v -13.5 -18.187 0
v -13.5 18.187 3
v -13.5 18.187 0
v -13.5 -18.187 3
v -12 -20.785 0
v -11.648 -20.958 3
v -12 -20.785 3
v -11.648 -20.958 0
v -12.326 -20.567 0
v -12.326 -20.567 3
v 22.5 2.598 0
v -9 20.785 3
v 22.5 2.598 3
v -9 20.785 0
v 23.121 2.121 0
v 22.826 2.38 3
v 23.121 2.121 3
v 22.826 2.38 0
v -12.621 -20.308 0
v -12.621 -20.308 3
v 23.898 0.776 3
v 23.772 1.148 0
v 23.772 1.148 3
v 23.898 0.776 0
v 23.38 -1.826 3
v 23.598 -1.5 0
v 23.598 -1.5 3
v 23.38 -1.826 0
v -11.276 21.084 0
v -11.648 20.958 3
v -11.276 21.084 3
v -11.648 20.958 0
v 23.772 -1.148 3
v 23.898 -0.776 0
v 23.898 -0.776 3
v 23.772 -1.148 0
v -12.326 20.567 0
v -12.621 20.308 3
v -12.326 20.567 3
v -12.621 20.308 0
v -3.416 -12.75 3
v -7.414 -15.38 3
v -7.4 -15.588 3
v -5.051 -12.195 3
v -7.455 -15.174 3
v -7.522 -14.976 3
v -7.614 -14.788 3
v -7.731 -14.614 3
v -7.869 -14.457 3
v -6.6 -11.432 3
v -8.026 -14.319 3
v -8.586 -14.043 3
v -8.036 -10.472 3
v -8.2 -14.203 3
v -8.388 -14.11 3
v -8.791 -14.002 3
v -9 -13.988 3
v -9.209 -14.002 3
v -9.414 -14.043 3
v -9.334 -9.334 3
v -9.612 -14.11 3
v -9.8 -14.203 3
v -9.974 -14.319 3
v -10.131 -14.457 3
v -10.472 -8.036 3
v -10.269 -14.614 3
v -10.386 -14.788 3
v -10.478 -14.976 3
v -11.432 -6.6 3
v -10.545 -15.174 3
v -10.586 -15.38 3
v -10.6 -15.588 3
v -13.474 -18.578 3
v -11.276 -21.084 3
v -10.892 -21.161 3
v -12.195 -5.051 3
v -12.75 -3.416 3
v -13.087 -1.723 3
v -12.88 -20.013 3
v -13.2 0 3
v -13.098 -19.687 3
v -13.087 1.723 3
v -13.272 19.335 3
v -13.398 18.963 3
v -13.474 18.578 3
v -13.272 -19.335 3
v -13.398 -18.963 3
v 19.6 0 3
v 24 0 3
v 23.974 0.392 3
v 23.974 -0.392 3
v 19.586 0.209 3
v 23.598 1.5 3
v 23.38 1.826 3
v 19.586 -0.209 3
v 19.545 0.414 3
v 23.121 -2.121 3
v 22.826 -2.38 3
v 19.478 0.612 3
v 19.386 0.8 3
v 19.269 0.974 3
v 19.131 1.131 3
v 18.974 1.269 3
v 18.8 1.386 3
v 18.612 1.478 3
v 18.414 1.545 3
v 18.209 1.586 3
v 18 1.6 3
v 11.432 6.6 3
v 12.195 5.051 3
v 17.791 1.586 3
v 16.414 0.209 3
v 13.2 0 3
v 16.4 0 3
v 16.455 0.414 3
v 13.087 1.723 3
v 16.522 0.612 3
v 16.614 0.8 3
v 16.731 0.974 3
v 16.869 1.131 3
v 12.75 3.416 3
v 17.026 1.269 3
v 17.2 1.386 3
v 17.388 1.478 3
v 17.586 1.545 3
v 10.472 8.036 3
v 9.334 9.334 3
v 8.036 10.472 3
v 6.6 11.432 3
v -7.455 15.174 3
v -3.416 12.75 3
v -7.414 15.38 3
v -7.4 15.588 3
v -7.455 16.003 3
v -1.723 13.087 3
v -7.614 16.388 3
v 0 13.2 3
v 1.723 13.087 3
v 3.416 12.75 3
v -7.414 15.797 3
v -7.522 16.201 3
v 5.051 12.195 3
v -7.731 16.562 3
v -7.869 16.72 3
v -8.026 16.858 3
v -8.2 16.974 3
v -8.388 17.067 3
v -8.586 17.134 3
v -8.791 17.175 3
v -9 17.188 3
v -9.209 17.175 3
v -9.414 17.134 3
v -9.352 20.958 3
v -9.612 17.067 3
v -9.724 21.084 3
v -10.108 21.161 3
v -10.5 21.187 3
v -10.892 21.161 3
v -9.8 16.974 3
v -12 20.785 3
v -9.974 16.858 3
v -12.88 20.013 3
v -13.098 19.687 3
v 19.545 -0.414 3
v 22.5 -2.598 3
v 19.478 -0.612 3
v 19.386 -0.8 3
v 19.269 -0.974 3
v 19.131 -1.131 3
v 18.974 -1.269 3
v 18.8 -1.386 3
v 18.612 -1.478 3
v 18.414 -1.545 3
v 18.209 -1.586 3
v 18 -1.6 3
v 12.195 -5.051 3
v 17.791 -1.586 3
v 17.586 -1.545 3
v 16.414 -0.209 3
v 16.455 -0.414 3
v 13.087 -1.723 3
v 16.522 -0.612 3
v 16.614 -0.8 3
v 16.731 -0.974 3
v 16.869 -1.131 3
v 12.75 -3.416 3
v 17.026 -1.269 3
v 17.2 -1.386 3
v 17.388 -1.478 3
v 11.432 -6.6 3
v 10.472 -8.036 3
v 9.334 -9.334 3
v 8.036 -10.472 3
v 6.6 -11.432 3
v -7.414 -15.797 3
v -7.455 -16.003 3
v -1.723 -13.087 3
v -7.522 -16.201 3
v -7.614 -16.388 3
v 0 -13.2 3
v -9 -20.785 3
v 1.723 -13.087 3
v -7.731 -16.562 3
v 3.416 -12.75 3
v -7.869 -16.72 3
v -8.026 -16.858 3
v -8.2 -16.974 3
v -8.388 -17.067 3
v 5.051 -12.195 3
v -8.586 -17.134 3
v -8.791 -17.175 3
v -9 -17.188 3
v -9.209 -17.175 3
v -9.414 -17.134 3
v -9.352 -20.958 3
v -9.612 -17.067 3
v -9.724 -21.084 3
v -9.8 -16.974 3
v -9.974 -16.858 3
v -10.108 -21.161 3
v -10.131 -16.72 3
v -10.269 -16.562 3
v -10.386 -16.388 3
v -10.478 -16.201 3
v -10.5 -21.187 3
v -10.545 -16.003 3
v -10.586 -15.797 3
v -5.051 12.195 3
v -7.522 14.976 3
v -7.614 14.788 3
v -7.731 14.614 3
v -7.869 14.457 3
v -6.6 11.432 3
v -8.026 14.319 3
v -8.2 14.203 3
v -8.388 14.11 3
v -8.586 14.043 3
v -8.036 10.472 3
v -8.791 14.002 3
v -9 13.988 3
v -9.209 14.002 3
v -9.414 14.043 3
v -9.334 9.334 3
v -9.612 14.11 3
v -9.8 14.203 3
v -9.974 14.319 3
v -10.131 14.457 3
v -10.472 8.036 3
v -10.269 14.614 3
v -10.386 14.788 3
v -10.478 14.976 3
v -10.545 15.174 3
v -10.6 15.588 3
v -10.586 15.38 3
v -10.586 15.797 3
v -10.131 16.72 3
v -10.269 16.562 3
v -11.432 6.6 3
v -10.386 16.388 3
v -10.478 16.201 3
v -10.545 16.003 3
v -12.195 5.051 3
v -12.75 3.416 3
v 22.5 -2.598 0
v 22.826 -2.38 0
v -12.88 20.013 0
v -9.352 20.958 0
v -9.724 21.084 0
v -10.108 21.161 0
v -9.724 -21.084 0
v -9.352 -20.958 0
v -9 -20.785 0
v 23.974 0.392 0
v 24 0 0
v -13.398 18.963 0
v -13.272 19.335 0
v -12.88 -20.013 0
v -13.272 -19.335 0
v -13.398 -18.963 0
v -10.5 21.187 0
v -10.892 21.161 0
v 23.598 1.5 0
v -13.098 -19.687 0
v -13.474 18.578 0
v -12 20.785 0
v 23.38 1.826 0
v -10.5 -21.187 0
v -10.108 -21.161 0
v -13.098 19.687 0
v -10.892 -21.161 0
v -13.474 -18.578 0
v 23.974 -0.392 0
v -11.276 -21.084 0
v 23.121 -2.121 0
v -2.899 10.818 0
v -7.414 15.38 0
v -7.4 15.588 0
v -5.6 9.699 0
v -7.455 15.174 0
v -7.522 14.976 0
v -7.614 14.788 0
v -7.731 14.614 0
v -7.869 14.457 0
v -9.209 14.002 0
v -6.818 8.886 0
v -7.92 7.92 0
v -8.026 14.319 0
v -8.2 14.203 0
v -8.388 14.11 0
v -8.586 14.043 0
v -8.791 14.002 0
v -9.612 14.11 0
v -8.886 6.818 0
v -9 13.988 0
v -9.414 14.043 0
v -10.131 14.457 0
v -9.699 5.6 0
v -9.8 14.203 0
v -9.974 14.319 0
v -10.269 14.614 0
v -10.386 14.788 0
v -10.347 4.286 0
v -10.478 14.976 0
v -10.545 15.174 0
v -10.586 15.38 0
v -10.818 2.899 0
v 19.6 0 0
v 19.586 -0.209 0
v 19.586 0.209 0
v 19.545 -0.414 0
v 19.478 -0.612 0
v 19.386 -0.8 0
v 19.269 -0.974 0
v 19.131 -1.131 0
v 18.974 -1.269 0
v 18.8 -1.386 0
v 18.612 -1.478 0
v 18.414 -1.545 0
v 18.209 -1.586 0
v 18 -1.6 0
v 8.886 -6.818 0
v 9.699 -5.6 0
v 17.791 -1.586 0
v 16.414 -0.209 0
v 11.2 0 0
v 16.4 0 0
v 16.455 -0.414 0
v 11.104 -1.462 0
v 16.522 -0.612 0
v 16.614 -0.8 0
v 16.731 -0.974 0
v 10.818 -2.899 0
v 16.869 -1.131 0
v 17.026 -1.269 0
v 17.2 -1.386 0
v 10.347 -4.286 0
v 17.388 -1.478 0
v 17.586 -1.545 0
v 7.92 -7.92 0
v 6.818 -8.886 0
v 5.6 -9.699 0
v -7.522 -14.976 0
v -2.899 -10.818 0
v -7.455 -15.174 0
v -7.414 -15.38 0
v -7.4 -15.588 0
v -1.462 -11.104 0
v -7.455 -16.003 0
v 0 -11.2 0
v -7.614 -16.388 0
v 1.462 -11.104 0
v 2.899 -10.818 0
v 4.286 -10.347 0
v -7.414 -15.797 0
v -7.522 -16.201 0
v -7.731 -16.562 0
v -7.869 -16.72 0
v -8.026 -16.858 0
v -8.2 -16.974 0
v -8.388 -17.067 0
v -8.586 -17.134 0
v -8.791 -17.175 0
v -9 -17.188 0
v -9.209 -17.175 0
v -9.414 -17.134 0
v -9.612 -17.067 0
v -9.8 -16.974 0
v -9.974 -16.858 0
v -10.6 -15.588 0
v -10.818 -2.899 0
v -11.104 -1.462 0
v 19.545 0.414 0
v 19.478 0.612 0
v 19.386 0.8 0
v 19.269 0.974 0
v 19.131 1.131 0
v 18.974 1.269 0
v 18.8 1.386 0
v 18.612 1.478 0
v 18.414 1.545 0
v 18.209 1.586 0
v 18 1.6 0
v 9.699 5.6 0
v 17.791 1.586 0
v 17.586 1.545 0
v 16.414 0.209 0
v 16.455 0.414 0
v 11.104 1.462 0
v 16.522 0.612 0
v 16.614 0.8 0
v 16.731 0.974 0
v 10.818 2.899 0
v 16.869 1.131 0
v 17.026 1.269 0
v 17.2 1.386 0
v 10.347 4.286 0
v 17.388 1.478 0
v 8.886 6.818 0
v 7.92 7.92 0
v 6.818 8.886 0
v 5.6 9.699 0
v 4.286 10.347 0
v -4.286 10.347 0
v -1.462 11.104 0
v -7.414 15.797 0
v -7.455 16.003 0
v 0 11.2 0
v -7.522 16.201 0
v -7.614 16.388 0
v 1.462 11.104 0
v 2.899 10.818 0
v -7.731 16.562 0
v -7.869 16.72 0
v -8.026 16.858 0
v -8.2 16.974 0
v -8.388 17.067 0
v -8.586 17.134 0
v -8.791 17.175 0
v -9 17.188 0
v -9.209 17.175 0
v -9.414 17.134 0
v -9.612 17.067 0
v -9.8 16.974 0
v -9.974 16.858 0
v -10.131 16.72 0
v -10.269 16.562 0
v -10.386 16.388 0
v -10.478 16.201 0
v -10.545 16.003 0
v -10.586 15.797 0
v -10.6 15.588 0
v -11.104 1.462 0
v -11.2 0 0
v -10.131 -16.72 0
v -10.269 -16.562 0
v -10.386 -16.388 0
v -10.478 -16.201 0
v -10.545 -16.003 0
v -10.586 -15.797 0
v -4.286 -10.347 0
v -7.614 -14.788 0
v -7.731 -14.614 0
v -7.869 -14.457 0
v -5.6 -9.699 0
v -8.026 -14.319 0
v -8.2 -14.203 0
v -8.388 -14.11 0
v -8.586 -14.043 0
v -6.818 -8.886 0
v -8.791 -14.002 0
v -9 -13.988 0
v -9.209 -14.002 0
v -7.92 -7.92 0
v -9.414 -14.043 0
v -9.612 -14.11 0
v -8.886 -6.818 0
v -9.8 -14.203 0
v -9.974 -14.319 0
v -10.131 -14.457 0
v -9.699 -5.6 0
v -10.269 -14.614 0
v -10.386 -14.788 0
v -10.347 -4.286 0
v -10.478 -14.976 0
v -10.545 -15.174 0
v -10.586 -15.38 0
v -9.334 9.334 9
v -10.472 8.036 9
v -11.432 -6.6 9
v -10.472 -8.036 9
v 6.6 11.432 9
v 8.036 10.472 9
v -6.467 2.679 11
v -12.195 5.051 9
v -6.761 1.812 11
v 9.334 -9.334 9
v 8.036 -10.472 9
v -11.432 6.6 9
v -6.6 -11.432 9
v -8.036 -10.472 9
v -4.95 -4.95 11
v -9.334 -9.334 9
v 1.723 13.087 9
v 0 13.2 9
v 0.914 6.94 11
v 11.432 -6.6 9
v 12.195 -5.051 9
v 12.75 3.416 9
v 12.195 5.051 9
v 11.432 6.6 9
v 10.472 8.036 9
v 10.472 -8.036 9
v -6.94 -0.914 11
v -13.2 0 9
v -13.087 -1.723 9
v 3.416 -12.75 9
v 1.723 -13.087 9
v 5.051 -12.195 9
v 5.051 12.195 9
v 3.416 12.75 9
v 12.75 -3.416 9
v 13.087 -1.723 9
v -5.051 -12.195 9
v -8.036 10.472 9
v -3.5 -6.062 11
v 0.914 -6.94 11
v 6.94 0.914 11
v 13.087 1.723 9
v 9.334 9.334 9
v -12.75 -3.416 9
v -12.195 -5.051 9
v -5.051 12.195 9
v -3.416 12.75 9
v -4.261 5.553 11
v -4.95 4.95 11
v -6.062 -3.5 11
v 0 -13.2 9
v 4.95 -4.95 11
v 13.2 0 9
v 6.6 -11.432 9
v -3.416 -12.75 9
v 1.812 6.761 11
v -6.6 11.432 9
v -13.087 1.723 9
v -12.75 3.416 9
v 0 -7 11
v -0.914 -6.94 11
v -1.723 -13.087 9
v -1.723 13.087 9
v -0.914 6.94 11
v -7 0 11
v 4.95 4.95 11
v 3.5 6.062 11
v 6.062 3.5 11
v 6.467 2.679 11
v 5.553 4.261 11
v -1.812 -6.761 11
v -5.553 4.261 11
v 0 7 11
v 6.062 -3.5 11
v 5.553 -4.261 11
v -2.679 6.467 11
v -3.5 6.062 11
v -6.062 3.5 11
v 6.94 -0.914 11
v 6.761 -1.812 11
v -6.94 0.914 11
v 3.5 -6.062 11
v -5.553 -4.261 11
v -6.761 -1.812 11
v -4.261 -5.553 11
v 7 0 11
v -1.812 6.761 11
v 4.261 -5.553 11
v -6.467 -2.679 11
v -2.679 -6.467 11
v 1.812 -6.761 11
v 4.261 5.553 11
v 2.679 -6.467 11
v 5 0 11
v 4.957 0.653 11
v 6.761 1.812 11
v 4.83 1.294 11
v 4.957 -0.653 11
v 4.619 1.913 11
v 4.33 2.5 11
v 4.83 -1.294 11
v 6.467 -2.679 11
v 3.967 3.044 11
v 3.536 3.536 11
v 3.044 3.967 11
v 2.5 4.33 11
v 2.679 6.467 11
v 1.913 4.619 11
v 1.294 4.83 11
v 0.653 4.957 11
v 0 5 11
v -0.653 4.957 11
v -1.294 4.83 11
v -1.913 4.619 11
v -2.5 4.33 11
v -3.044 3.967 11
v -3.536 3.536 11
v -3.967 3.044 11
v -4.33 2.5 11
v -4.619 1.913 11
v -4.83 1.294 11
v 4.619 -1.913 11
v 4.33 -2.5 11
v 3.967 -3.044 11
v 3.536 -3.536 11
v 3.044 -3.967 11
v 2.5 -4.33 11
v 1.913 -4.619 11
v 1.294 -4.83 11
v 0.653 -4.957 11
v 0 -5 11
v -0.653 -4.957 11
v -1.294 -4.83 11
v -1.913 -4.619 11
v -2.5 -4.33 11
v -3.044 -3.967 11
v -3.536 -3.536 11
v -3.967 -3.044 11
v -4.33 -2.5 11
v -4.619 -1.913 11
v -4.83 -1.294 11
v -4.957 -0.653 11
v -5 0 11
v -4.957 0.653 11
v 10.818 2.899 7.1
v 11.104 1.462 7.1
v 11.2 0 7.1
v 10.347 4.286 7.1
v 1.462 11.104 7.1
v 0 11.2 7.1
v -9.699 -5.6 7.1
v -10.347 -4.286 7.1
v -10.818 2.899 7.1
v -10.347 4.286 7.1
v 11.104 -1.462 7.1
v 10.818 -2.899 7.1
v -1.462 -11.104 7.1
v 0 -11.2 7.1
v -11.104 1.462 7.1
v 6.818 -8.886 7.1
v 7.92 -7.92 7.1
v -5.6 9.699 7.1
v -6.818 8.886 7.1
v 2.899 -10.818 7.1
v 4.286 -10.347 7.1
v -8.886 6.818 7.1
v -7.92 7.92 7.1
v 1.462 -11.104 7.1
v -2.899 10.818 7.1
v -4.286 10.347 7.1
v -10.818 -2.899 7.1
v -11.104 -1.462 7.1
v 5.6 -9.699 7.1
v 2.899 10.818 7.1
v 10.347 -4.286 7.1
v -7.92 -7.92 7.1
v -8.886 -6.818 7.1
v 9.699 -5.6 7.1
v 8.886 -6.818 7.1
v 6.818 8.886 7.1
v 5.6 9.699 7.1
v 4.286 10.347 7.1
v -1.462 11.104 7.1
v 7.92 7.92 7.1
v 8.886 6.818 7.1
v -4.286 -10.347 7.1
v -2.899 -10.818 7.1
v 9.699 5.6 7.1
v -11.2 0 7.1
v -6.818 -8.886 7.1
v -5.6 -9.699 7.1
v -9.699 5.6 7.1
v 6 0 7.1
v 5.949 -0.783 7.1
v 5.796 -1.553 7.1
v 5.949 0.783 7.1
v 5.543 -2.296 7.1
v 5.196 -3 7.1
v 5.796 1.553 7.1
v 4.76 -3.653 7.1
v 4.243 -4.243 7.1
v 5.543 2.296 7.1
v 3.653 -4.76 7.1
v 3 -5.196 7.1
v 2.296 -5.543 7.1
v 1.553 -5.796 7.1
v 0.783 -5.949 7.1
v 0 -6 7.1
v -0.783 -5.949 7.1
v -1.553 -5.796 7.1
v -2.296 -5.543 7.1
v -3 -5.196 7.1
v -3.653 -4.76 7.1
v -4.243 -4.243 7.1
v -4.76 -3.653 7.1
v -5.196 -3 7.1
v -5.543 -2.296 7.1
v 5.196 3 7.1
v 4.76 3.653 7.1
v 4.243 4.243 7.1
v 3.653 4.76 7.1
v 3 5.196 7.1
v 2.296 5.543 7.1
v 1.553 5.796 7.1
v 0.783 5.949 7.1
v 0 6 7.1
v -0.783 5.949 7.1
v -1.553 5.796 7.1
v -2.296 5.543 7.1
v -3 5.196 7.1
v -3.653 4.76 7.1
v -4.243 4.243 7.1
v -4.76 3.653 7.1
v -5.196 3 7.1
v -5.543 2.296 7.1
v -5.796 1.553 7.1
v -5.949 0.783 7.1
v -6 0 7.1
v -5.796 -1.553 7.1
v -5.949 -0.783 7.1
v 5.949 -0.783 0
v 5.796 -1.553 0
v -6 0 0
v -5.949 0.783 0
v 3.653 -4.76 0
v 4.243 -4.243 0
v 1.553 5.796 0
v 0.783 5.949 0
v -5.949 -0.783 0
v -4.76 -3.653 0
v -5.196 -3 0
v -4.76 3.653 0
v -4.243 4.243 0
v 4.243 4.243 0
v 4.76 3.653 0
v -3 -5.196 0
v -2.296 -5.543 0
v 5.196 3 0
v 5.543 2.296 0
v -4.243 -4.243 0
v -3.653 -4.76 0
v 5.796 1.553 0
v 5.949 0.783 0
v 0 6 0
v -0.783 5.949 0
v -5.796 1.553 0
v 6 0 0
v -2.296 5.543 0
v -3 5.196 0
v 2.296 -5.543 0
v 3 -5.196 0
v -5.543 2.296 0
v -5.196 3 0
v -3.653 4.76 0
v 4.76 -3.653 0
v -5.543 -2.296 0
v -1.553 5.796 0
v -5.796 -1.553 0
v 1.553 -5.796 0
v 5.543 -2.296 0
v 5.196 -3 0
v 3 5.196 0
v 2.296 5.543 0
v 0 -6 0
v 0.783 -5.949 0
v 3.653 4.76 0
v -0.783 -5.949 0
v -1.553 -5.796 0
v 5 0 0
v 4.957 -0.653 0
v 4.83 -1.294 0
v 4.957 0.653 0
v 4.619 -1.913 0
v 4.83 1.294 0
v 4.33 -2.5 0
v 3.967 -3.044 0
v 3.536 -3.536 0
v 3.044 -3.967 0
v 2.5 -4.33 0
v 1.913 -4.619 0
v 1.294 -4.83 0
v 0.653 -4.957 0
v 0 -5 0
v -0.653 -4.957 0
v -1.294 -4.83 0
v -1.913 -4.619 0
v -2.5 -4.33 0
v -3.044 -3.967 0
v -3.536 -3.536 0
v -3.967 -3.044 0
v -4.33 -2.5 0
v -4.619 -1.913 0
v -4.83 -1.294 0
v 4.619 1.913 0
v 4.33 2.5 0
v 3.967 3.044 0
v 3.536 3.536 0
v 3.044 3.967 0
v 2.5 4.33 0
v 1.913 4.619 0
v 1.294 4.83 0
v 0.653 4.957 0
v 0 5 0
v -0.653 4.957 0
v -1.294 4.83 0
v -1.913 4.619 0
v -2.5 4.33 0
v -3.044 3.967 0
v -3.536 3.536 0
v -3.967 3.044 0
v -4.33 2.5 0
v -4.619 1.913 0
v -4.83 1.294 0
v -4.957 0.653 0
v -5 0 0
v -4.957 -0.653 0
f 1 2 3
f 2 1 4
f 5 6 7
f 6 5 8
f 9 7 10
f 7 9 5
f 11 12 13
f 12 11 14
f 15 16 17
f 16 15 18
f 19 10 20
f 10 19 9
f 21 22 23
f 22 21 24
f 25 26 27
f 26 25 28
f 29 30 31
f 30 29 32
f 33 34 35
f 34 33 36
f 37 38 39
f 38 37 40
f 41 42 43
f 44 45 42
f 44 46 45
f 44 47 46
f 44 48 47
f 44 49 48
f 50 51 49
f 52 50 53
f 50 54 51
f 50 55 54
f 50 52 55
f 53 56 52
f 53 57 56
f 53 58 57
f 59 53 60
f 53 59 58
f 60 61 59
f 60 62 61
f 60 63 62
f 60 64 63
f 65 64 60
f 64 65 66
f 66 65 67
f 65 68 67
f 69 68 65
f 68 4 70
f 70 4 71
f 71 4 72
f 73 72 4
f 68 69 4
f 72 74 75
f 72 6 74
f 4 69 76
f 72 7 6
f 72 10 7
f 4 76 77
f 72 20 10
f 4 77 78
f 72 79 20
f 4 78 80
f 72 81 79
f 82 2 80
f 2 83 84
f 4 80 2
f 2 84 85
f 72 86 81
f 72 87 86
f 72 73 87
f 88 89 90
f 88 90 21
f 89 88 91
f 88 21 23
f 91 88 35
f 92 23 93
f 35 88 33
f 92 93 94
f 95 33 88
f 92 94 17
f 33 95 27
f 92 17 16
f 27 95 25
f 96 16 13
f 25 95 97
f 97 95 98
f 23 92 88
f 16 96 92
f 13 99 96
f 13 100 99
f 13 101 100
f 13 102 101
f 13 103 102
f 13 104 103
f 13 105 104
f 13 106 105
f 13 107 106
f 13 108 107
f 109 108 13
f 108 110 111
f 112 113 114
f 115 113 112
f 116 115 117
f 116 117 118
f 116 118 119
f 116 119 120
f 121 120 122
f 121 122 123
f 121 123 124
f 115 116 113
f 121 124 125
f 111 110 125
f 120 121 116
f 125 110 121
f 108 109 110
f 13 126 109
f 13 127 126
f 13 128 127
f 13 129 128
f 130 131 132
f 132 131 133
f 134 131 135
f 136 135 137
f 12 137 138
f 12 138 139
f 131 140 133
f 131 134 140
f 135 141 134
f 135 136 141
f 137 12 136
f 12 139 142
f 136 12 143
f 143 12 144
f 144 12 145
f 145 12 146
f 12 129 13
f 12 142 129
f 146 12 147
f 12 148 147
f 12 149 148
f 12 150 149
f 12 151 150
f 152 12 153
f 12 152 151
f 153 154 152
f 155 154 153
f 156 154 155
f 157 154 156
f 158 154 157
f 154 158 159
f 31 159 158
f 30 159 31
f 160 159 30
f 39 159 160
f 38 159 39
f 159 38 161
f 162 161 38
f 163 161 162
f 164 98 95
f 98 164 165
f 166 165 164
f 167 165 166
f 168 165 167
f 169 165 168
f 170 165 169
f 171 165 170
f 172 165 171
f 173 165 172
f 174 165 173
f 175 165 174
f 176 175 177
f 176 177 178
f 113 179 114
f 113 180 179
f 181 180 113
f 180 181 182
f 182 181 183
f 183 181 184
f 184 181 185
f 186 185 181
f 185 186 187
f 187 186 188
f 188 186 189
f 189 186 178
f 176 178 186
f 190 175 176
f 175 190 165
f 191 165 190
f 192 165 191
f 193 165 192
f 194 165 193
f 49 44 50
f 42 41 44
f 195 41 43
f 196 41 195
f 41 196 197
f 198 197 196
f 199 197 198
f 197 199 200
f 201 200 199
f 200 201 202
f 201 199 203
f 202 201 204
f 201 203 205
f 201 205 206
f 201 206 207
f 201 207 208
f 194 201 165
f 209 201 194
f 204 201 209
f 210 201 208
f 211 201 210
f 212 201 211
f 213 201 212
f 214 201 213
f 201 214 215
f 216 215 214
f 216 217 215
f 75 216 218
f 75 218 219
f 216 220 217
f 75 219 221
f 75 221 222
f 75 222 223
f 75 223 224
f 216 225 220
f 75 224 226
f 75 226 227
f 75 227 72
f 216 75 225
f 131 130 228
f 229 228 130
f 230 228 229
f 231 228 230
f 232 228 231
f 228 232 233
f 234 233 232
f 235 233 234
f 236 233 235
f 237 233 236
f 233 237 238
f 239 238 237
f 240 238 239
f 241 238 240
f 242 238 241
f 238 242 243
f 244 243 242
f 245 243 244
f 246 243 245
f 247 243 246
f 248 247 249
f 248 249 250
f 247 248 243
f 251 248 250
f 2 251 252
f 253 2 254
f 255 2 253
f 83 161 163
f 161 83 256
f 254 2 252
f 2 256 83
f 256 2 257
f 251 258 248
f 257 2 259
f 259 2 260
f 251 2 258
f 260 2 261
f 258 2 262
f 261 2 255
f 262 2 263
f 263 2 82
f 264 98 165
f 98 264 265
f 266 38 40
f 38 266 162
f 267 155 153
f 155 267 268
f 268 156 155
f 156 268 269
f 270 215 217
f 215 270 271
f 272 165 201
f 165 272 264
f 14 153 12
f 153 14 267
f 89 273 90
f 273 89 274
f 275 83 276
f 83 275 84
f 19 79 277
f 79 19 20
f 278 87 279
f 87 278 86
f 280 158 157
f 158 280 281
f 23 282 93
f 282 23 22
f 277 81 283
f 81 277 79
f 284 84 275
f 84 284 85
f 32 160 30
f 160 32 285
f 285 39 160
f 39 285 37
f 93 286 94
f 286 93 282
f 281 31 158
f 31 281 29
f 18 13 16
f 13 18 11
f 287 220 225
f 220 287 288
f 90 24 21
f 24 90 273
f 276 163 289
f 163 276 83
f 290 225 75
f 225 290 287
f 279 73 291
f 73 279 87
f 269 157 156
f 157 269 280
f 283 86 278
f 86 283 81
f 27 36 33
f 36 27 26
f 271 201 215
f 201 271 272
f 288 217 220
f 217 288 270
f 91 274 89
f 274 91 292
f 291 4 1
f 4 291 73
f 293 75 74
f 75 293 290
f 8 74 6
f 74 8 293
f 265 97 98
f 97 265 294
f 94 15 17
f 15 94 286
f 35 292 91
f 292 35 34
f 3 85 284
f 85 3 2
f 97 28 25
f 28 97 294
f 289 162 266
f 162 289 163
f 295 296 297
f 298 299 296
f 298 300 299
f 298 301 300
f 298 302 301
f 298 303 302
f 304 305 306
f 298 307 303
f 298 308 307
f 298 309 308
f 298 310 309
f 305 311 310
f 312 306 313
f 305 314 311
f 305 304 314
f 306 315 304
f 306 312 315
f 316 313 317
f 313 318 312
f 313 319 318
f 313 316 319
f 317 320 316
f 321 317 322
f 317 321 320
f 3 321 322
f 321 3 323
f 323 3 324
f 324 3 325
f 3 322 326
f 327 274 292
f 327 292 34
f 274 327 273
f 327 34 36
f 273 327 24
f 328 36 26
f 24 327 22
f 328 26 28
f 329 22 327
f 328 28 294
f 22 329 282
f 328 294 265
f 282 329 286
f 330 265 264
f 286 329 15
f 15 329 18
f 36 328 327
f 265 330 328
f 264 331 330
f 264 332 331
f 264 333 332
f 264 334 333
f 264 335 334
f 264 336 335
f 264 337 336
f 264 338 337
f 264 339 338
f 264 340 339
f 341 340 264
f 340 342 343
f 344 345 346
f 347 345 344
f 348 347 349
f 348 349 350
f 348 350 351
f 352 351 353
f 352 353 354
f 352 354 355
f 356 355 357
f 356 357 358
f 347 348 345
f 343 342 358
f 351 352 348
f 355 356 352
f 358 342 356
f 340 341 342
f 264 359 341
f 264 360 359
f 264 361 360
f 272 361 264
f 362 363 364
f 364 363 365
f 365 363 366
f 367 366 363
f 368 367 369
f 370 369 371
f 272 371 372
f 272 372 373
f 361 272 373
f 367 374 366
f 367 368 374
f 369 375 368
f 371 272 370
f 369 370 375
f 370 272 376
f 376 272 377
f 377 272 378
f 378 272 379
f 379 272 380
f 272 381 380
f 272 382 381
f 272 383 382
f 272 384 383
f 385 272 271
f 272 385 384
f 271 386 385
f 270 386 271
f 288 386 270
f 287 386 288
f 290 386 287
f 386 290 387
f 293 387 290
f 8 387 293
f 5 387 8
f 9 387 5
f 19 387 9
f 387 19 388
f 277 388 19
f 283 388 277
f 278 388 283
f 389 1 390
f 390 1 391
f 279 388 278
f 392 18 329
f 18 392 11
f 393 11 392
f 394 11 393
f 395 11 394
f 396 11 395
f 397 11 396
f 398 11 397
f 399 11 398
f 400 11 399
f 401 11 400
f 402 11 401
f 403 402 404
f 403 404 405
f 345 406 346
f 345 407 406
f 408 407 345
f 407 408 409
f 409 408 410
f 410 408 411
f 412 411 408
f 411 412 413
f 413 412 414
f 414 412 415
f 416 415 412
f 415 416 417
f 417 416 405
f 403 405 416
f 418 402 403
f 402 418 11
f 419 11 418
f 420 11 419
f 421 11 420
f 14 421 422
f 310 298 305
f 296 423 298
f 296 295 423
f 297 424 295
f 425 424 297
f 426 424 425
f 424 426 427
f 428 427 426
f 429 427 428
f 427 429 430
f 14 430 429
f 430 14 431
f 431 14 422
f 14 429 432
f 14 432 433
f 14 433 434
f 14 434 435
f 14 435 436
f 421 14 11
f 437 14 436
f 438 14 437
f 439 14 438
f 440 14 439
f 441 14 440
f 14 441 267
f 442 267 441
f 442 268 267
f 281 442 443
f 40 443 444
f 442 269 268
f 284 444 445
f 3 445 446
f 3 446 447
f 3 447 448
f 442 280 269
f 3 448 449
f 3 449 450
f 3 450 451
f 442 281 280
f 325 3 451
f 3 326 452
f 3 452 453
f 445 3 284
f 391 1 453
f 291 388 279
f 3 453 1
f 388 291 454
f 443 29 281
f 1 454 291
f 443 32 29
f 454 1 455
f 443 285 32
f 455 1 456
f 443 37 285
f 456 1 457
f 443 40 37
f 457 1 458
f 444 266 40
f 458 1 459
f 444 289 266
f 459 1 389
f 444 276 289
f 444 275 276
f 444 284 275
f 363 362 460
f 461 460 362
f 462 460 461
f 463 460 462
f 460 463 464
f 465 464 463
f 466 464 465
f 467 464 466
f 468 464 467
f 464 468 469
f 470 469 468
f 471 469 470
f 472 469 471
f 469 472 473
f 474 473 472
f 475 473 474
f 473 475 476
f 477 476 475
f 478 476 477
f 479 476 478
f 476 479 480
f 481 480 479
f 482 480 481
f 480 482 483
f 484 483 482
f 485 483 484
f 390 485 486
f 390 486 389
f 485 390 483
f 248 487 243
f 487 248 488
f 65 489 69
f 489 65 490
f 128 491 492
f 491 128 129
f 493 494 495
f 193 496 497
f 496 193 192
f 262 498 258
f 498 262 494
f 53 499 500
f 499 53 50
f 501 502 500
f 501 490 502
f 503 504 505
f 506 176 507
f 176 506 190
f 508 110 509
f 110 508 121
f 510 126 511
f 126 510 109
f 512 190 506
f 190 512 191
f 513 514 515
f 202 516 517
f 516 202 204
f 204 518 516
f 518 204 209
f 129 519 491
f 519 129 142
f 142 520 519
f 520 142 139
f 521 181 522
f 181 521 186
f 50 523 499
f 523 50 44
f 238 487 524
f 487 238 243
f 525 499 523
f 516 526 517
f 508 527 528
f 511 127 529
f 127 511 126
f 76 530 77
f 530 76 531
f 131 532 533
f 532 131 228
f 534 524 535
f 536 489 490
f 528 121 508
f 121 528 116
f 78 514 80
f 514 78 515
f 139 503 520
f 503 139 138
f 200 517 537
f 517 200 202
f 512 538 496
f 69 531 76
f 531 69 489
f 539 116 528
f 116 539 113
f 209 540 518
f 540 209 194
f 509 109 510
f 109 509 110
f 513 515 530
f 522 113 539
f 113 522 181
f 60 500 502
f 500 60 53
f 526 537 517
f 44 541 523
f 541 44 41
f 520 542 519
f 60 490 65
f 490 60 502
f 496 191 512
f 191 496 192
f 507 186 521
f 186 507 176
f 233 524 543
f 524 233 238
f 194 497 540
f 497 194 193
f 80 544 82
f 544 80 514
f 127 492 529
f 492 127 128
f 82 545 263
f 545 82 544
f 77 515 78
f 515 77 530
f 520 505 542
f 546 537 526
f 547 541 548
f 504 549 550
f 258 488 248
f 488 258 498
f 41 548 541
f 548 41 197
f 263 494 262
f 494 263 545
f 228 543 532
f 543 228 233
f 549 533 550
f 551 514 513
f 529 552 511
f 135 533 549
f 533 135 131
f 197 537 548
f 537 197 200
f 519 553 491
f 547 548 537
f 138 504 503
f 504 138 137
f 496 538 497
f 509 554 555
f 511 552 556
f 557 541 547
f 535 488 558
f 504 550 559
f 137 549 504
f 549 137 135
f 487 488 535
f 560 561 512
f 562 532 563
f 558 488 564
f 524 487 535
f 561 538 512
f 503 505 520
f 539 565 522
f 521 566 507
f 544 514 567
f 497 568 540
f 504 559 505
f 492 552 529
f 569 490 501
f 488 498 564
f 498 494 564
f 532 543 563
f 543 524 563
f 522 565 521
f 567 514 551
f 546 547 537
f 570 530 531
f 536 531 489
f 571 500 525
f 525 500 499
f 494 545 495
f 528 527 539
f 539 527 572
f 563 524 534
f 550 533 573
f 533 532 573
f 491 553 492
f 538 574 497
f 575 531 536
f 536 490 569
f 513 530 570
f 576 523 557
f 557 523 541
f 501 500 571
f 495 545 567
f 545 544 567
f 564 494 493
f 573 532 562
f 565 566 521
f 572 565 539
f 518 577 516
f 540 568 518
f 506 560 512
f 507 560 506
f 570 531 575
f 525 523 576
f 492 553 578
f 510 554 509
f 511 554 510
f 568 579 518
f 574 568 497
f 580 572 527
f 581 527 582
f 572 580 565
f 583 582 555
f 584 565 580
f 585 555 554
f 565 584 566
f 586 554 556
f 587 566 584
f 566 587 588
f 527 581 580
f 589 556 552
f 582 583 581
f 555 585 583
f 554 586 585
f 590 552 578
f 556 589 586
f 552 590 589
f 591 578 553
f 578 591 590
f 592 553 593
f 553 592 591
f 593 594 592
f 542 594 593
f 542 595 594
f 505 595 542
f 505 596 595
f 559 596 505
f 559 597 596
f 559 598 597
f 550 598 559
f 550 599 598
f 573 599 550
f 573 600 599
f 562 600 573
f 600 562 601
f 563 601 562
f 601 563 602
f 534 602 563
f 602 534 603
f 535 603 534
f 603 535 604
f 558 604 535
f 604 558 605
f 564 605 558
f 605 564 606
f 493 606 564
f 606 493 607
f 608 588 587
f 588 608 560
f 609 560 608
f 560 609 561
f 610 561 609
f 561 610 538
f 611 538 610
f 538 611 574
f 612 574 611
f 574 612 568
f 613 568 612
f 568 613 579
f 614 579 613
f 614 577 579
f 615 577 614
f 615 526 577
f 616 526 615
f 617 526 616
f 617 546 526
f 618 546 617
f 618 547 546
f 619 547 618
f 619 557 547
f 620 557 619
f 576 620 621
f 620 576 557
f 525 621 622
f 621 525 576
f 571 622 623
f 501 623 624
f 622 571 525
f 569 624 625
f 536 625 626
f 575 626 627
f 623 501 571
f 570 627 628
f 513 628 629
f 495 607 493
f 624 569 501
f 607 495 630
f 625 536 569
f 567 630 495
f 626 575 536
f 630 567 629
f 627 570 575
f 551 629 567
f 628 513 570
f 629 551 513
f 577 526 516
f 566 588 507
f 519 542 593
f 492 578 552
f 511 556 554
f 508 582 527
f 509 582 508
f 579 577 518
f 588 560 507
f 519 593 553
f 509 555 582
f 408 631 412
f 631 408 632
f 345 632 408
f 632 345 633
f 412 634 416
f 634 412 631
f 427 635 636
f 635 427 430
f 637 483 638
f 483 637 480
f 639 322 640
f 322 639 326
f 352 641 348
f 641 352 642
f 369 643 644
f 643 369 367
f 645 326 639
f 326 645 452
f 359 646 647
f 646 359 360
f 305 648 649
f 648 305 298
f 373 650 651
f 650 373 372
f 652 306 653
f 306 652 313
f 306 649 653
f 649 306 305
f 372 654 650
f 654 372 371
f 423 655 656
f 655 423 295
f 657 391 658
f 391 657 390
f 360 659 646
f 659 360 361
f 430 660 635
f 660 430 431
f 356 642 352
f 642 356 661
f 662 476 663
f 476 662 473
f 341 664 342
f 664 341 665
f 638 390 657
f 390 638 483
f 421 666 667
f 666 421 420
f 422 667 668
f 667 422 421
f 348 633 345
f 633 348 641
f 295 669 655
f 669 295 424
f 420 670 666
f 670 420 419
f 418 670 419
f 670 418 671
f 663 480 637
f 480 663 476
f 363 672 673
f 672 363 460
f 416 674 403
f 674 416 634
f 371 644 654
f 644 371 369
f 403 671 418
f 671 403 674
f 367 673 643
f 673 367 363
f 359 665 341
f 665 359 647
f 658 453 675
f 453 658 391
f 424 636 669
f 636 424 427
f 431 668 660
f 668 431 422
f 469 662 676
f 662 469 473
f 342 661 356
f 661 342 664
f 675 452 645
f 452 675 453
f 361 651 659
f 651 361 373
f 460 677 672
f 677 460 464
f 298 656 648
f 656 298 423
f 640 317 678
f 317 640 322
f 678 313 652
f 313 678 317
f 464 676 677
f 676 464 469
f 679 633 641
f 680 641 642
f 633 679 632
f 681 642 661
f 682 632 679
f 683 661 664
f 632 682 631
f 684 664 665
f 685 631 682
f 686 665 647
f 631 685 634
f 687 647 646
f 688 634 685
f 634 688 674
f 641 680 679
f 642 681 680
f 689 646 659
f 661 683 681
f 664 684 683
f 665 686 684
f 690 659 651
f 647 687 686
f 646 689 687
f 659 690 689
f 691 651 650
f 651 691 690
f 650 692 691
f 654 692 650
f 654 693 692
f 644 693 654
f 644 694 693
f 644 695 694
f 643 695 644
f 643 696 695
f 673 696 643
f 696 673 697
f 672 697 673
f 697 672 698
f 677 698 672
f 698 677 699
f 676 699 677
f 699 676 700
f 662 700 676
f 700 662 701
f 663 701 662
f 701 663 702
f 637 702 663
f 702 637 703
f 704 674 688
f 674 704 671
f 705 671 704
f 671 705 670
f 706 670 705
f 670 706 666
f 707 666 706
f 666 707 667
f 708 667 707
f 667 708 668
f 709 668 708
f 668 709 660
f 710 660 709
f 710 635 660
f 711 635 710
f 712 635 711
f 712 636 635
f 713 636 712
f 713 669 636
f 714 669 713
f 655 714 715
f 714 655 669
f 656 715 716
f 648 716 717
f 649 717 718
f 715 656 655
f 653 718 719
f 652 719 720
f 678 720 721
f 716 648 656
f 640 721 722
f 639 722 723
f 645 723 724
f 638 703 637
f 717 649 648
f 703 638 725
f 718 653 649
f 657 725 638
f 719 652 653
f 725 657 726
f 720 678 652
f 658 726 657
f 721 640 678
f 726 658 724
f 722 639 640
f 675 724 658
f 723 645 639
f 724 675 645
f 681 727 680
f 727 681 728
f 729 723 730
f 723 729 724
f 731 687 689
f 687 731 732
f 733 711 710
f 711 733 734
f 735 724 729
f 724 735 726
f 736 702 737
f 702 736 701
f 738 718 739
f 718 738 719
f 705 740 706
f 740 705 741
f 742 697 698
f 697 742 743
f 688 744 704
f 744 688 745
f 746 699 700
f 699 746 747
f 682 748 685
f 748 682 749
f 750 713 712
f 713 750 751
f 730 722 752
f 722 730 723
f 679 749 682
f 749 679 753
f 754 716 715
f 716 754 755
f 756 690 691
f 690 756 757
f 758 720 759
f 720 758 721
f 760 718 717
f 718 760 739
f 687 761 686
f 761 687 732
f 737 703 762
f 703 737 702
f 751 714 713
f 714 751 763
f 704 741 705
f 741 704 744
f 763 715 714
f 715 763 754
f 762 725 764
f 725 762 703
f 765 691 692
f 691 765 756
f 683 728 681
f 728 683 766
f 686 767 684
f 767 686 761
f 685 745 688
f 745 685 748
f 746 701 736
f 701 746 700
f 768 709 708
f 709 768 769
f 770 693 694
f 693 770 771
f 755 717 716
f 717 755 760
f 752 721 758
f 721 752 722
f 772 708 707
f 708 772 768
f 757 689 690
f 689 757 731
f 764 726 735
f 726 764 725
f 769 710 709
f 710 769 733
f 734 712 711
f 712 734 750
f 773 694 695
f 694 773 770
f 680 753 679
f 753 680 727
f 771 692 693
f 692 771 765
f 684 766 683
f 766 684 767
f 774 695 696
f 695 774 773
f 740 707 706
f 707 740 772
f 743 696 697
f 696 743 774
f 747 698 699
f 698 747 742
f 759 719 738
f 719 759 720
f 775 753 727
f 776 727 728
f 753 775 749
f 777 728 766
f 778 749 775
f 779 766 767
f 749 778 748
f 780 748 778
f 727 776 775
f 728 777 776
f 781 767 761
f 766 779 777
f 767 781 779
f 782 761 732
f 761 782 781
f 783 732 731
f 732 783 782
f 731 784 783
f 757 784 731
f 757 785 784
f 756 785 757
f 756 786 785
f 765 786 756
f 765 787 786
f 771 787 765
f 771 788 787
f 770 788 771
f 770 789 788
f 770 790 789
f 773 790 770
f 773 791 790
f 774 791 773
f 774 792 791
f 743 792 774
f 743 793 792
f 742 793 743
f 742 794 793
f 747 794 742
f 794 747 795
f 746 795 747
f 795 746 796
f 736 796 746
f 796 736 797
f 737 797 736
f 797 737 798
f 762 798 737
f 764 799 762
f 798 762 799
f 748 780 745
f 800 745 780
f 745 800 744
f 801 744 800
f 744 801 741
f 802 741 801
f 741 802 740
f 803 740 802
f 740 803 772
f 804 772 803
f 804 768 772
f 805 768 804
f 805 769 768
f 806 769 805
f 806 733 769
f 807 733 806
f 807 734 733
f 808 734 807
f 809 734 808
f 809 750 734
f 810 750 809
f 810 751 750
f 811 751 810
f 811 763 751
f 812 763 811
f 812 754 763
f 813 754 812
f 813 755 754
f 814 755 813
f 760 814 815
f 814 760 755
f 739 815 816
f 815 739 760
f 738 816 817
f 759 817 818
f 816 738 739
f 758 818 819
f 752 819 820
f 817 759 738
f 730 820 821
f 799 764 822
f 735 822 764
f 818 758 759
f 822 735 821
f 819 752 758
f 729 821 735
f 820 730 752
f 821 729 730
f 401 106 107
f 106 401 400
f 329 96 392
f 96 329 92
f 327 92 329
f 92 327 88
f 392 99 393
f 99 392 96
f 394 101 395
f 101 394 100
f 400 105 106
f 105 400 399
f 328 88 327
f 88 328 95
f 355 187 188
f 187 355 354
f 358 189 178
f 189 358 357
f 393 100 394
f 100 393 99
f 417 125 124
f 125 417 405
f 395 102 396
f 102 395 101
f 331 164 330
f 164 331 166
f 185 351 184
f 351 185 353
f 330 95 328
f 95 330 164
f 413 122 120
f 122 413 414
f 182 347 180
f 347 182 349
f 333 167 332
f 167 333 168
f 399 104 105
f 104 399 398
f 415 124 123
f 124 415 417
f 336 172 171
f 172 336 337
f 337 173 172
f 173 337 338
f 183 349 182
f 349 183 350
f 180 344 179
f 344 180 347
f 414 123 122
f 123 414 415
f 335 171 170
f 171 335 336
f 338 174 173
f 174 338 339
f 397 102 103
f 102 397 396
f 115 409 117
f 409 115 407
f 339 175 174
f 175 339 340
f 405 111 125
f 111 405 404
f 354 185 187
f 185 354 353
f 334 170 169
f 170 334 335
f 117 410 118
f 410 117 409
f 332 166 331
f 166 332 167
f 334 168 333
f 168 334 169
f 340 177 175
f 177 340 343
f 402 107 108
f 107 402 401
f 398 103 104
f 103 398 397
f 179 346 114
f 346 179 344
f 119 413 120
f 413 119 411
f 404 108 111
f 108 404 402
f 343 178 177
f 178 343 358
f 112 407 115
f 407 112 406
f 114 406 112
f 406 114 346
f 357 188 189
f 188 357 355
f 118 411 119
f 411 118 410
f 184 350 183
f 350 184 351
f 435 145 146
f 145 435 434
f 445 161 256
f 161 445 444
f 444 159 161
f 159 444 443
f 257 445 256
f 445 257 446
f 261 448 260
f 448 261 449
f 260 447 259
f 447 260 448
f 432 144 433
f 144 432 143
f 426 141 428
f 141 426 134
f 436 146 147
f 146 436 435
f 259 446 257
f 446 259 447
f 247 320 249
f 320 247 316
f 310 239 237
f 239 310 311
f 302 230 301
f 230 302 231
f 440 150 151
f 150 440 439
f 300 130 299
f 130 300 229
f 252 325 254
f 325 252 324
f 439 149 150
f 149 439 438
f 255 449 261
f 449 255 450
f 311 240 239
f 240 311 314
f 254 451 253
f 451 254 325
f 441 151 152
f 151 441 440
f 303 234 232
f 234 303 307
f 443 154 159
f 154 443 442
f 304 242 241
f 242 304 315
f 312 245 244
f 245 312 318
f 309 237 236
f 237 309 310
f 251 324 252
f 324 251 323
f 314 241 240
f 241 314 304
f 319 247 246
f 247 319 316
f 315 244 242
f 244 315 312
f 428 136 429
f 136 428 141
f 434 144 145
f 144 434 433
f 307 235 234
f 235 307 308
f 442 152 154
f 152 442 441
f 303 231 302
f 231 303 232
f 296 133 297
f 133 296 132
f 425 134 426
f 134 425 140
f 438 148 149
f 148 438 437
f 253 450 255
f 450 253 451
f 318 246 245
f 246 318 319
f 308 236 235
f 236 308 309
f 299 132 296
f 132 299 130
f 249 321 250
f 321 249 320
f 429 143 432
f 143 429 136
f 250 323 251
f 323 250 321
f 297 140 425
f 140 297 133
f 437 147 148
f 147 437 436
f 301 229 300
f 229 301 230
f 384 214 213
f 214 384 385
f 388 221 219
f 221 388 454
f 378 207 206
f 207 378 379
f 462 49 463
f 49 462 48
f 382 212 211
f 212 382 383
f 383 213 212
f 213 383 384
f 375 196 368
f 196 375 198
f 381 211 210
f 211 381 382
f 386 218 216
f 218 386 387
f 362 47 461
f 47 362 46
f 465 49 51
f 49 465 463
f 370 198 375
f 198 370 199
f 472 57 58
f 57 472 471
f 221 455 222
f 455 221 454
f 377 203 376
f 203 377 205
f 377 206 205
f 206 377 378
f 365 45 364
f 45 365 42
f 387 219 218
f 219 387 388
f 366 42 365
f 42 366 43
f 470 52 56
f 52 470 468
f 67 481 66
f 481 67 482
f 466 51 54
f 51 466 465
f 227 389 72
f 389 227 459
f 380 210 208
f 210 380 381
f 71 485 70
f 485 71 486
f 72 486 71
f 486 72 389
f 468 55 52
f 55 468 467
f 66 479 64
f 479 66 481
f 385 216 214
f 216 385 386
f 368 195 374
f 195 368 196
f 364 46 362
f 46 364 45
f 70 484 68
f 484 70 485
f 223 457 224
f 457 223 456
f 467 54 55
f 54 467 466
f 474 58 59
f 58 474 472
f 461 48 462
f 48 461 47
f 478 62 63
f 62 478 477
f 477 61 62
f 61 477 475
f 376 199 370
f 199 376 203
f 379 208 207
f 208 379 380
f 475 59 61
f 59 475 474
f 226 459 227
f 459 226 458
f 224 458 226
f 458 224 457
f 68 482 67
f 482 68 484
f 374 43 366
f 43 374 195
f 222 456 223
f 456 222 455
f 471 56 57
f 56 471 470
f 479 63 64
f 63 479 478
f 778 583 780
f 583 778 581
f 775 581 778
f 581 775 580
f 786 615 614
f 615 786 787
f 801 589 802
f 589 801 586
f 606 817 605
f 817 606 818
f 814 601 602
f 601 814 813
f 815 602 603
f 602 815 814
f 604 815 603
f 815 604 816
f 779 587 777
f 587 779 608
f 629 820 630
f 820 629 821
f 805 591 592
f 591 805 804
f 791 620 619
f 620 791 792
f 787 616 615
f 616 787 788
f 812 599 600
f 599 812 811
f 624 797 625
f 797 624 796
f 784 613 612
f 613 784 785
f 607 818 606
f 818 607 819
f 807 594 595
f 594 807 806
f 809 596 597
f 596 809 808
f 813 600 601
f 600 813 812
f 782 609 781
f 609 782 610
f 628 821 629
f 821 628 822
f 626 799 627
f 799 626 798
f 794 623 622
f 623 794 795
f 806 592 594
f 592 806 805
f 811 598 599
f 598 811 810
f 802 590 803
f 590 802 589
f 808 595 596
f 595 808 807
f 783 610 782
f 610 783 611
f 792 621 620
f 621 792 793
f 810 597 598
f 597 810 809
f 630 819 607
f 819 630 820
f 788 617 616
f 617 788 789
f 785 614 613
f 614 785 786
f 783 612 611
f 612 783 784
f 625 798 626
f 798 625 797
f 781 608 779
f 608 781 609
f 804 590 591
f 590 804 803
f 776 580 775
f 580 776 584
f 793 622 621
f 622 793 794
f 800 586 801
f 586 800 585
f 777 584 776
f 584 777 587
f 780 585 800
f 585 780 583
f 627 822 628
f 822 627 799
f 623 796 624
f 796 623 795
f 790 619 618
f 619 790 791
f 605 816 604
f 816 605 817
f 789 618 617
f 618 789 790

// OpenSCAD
//number of sides of the holder plate
NumberOfSides = 3;
//dimension of the bearing outer dimension
DiameterOfBearing = 22;
//dimension of the bearing height
HeightOfBearing = 7;
//dimension of the bearing inner dimension
InnerDiameterBearing = 10;
//Screw holes diameter to fixen the holder
ScrewHoles = 3.2;

$fn=48;
difference(){
union(){
difference()
{
union(){
hull(){
//Generate the base plate
for (i=[0:NumberOfSides-1])
{
rotate([0,0,(360/NumberOfSides)*i])translate([DiameterOfBearing/2+10,0,0])cylinder(r=3,h=3);
}
}
hull(){
cylinder(r=DiameterOfBearing/2+0.2+2, h=HeightOfBearing+2);
translate([0,0,HeightOfBearing+2])cylinder(r=InnerDiameterBearing/2+2, h=2);
}
}
//space holder for the Bearing
cylinder(r=DiameterOfBearing/2+0.2, h=HeightOfBearing+0.1);
}
//inner support for the bearing roof
cylinder(r=InnerDiameterBearing/2+1,h = HeightOfBearing + 2);
}
//the inner hole
cylinder(r=InnerDiameterBearing/2,h = HeightOfBearing + 6);

//generate the fixing holes
for (i=[0:NumberOfSides-1])
{
rotate([0,0,(360/NumberOfSides)*i])translate([DiameterOfBearing/2+7,0,0])cylinder(r=ScrewHoles/2,h=3);
}
}
